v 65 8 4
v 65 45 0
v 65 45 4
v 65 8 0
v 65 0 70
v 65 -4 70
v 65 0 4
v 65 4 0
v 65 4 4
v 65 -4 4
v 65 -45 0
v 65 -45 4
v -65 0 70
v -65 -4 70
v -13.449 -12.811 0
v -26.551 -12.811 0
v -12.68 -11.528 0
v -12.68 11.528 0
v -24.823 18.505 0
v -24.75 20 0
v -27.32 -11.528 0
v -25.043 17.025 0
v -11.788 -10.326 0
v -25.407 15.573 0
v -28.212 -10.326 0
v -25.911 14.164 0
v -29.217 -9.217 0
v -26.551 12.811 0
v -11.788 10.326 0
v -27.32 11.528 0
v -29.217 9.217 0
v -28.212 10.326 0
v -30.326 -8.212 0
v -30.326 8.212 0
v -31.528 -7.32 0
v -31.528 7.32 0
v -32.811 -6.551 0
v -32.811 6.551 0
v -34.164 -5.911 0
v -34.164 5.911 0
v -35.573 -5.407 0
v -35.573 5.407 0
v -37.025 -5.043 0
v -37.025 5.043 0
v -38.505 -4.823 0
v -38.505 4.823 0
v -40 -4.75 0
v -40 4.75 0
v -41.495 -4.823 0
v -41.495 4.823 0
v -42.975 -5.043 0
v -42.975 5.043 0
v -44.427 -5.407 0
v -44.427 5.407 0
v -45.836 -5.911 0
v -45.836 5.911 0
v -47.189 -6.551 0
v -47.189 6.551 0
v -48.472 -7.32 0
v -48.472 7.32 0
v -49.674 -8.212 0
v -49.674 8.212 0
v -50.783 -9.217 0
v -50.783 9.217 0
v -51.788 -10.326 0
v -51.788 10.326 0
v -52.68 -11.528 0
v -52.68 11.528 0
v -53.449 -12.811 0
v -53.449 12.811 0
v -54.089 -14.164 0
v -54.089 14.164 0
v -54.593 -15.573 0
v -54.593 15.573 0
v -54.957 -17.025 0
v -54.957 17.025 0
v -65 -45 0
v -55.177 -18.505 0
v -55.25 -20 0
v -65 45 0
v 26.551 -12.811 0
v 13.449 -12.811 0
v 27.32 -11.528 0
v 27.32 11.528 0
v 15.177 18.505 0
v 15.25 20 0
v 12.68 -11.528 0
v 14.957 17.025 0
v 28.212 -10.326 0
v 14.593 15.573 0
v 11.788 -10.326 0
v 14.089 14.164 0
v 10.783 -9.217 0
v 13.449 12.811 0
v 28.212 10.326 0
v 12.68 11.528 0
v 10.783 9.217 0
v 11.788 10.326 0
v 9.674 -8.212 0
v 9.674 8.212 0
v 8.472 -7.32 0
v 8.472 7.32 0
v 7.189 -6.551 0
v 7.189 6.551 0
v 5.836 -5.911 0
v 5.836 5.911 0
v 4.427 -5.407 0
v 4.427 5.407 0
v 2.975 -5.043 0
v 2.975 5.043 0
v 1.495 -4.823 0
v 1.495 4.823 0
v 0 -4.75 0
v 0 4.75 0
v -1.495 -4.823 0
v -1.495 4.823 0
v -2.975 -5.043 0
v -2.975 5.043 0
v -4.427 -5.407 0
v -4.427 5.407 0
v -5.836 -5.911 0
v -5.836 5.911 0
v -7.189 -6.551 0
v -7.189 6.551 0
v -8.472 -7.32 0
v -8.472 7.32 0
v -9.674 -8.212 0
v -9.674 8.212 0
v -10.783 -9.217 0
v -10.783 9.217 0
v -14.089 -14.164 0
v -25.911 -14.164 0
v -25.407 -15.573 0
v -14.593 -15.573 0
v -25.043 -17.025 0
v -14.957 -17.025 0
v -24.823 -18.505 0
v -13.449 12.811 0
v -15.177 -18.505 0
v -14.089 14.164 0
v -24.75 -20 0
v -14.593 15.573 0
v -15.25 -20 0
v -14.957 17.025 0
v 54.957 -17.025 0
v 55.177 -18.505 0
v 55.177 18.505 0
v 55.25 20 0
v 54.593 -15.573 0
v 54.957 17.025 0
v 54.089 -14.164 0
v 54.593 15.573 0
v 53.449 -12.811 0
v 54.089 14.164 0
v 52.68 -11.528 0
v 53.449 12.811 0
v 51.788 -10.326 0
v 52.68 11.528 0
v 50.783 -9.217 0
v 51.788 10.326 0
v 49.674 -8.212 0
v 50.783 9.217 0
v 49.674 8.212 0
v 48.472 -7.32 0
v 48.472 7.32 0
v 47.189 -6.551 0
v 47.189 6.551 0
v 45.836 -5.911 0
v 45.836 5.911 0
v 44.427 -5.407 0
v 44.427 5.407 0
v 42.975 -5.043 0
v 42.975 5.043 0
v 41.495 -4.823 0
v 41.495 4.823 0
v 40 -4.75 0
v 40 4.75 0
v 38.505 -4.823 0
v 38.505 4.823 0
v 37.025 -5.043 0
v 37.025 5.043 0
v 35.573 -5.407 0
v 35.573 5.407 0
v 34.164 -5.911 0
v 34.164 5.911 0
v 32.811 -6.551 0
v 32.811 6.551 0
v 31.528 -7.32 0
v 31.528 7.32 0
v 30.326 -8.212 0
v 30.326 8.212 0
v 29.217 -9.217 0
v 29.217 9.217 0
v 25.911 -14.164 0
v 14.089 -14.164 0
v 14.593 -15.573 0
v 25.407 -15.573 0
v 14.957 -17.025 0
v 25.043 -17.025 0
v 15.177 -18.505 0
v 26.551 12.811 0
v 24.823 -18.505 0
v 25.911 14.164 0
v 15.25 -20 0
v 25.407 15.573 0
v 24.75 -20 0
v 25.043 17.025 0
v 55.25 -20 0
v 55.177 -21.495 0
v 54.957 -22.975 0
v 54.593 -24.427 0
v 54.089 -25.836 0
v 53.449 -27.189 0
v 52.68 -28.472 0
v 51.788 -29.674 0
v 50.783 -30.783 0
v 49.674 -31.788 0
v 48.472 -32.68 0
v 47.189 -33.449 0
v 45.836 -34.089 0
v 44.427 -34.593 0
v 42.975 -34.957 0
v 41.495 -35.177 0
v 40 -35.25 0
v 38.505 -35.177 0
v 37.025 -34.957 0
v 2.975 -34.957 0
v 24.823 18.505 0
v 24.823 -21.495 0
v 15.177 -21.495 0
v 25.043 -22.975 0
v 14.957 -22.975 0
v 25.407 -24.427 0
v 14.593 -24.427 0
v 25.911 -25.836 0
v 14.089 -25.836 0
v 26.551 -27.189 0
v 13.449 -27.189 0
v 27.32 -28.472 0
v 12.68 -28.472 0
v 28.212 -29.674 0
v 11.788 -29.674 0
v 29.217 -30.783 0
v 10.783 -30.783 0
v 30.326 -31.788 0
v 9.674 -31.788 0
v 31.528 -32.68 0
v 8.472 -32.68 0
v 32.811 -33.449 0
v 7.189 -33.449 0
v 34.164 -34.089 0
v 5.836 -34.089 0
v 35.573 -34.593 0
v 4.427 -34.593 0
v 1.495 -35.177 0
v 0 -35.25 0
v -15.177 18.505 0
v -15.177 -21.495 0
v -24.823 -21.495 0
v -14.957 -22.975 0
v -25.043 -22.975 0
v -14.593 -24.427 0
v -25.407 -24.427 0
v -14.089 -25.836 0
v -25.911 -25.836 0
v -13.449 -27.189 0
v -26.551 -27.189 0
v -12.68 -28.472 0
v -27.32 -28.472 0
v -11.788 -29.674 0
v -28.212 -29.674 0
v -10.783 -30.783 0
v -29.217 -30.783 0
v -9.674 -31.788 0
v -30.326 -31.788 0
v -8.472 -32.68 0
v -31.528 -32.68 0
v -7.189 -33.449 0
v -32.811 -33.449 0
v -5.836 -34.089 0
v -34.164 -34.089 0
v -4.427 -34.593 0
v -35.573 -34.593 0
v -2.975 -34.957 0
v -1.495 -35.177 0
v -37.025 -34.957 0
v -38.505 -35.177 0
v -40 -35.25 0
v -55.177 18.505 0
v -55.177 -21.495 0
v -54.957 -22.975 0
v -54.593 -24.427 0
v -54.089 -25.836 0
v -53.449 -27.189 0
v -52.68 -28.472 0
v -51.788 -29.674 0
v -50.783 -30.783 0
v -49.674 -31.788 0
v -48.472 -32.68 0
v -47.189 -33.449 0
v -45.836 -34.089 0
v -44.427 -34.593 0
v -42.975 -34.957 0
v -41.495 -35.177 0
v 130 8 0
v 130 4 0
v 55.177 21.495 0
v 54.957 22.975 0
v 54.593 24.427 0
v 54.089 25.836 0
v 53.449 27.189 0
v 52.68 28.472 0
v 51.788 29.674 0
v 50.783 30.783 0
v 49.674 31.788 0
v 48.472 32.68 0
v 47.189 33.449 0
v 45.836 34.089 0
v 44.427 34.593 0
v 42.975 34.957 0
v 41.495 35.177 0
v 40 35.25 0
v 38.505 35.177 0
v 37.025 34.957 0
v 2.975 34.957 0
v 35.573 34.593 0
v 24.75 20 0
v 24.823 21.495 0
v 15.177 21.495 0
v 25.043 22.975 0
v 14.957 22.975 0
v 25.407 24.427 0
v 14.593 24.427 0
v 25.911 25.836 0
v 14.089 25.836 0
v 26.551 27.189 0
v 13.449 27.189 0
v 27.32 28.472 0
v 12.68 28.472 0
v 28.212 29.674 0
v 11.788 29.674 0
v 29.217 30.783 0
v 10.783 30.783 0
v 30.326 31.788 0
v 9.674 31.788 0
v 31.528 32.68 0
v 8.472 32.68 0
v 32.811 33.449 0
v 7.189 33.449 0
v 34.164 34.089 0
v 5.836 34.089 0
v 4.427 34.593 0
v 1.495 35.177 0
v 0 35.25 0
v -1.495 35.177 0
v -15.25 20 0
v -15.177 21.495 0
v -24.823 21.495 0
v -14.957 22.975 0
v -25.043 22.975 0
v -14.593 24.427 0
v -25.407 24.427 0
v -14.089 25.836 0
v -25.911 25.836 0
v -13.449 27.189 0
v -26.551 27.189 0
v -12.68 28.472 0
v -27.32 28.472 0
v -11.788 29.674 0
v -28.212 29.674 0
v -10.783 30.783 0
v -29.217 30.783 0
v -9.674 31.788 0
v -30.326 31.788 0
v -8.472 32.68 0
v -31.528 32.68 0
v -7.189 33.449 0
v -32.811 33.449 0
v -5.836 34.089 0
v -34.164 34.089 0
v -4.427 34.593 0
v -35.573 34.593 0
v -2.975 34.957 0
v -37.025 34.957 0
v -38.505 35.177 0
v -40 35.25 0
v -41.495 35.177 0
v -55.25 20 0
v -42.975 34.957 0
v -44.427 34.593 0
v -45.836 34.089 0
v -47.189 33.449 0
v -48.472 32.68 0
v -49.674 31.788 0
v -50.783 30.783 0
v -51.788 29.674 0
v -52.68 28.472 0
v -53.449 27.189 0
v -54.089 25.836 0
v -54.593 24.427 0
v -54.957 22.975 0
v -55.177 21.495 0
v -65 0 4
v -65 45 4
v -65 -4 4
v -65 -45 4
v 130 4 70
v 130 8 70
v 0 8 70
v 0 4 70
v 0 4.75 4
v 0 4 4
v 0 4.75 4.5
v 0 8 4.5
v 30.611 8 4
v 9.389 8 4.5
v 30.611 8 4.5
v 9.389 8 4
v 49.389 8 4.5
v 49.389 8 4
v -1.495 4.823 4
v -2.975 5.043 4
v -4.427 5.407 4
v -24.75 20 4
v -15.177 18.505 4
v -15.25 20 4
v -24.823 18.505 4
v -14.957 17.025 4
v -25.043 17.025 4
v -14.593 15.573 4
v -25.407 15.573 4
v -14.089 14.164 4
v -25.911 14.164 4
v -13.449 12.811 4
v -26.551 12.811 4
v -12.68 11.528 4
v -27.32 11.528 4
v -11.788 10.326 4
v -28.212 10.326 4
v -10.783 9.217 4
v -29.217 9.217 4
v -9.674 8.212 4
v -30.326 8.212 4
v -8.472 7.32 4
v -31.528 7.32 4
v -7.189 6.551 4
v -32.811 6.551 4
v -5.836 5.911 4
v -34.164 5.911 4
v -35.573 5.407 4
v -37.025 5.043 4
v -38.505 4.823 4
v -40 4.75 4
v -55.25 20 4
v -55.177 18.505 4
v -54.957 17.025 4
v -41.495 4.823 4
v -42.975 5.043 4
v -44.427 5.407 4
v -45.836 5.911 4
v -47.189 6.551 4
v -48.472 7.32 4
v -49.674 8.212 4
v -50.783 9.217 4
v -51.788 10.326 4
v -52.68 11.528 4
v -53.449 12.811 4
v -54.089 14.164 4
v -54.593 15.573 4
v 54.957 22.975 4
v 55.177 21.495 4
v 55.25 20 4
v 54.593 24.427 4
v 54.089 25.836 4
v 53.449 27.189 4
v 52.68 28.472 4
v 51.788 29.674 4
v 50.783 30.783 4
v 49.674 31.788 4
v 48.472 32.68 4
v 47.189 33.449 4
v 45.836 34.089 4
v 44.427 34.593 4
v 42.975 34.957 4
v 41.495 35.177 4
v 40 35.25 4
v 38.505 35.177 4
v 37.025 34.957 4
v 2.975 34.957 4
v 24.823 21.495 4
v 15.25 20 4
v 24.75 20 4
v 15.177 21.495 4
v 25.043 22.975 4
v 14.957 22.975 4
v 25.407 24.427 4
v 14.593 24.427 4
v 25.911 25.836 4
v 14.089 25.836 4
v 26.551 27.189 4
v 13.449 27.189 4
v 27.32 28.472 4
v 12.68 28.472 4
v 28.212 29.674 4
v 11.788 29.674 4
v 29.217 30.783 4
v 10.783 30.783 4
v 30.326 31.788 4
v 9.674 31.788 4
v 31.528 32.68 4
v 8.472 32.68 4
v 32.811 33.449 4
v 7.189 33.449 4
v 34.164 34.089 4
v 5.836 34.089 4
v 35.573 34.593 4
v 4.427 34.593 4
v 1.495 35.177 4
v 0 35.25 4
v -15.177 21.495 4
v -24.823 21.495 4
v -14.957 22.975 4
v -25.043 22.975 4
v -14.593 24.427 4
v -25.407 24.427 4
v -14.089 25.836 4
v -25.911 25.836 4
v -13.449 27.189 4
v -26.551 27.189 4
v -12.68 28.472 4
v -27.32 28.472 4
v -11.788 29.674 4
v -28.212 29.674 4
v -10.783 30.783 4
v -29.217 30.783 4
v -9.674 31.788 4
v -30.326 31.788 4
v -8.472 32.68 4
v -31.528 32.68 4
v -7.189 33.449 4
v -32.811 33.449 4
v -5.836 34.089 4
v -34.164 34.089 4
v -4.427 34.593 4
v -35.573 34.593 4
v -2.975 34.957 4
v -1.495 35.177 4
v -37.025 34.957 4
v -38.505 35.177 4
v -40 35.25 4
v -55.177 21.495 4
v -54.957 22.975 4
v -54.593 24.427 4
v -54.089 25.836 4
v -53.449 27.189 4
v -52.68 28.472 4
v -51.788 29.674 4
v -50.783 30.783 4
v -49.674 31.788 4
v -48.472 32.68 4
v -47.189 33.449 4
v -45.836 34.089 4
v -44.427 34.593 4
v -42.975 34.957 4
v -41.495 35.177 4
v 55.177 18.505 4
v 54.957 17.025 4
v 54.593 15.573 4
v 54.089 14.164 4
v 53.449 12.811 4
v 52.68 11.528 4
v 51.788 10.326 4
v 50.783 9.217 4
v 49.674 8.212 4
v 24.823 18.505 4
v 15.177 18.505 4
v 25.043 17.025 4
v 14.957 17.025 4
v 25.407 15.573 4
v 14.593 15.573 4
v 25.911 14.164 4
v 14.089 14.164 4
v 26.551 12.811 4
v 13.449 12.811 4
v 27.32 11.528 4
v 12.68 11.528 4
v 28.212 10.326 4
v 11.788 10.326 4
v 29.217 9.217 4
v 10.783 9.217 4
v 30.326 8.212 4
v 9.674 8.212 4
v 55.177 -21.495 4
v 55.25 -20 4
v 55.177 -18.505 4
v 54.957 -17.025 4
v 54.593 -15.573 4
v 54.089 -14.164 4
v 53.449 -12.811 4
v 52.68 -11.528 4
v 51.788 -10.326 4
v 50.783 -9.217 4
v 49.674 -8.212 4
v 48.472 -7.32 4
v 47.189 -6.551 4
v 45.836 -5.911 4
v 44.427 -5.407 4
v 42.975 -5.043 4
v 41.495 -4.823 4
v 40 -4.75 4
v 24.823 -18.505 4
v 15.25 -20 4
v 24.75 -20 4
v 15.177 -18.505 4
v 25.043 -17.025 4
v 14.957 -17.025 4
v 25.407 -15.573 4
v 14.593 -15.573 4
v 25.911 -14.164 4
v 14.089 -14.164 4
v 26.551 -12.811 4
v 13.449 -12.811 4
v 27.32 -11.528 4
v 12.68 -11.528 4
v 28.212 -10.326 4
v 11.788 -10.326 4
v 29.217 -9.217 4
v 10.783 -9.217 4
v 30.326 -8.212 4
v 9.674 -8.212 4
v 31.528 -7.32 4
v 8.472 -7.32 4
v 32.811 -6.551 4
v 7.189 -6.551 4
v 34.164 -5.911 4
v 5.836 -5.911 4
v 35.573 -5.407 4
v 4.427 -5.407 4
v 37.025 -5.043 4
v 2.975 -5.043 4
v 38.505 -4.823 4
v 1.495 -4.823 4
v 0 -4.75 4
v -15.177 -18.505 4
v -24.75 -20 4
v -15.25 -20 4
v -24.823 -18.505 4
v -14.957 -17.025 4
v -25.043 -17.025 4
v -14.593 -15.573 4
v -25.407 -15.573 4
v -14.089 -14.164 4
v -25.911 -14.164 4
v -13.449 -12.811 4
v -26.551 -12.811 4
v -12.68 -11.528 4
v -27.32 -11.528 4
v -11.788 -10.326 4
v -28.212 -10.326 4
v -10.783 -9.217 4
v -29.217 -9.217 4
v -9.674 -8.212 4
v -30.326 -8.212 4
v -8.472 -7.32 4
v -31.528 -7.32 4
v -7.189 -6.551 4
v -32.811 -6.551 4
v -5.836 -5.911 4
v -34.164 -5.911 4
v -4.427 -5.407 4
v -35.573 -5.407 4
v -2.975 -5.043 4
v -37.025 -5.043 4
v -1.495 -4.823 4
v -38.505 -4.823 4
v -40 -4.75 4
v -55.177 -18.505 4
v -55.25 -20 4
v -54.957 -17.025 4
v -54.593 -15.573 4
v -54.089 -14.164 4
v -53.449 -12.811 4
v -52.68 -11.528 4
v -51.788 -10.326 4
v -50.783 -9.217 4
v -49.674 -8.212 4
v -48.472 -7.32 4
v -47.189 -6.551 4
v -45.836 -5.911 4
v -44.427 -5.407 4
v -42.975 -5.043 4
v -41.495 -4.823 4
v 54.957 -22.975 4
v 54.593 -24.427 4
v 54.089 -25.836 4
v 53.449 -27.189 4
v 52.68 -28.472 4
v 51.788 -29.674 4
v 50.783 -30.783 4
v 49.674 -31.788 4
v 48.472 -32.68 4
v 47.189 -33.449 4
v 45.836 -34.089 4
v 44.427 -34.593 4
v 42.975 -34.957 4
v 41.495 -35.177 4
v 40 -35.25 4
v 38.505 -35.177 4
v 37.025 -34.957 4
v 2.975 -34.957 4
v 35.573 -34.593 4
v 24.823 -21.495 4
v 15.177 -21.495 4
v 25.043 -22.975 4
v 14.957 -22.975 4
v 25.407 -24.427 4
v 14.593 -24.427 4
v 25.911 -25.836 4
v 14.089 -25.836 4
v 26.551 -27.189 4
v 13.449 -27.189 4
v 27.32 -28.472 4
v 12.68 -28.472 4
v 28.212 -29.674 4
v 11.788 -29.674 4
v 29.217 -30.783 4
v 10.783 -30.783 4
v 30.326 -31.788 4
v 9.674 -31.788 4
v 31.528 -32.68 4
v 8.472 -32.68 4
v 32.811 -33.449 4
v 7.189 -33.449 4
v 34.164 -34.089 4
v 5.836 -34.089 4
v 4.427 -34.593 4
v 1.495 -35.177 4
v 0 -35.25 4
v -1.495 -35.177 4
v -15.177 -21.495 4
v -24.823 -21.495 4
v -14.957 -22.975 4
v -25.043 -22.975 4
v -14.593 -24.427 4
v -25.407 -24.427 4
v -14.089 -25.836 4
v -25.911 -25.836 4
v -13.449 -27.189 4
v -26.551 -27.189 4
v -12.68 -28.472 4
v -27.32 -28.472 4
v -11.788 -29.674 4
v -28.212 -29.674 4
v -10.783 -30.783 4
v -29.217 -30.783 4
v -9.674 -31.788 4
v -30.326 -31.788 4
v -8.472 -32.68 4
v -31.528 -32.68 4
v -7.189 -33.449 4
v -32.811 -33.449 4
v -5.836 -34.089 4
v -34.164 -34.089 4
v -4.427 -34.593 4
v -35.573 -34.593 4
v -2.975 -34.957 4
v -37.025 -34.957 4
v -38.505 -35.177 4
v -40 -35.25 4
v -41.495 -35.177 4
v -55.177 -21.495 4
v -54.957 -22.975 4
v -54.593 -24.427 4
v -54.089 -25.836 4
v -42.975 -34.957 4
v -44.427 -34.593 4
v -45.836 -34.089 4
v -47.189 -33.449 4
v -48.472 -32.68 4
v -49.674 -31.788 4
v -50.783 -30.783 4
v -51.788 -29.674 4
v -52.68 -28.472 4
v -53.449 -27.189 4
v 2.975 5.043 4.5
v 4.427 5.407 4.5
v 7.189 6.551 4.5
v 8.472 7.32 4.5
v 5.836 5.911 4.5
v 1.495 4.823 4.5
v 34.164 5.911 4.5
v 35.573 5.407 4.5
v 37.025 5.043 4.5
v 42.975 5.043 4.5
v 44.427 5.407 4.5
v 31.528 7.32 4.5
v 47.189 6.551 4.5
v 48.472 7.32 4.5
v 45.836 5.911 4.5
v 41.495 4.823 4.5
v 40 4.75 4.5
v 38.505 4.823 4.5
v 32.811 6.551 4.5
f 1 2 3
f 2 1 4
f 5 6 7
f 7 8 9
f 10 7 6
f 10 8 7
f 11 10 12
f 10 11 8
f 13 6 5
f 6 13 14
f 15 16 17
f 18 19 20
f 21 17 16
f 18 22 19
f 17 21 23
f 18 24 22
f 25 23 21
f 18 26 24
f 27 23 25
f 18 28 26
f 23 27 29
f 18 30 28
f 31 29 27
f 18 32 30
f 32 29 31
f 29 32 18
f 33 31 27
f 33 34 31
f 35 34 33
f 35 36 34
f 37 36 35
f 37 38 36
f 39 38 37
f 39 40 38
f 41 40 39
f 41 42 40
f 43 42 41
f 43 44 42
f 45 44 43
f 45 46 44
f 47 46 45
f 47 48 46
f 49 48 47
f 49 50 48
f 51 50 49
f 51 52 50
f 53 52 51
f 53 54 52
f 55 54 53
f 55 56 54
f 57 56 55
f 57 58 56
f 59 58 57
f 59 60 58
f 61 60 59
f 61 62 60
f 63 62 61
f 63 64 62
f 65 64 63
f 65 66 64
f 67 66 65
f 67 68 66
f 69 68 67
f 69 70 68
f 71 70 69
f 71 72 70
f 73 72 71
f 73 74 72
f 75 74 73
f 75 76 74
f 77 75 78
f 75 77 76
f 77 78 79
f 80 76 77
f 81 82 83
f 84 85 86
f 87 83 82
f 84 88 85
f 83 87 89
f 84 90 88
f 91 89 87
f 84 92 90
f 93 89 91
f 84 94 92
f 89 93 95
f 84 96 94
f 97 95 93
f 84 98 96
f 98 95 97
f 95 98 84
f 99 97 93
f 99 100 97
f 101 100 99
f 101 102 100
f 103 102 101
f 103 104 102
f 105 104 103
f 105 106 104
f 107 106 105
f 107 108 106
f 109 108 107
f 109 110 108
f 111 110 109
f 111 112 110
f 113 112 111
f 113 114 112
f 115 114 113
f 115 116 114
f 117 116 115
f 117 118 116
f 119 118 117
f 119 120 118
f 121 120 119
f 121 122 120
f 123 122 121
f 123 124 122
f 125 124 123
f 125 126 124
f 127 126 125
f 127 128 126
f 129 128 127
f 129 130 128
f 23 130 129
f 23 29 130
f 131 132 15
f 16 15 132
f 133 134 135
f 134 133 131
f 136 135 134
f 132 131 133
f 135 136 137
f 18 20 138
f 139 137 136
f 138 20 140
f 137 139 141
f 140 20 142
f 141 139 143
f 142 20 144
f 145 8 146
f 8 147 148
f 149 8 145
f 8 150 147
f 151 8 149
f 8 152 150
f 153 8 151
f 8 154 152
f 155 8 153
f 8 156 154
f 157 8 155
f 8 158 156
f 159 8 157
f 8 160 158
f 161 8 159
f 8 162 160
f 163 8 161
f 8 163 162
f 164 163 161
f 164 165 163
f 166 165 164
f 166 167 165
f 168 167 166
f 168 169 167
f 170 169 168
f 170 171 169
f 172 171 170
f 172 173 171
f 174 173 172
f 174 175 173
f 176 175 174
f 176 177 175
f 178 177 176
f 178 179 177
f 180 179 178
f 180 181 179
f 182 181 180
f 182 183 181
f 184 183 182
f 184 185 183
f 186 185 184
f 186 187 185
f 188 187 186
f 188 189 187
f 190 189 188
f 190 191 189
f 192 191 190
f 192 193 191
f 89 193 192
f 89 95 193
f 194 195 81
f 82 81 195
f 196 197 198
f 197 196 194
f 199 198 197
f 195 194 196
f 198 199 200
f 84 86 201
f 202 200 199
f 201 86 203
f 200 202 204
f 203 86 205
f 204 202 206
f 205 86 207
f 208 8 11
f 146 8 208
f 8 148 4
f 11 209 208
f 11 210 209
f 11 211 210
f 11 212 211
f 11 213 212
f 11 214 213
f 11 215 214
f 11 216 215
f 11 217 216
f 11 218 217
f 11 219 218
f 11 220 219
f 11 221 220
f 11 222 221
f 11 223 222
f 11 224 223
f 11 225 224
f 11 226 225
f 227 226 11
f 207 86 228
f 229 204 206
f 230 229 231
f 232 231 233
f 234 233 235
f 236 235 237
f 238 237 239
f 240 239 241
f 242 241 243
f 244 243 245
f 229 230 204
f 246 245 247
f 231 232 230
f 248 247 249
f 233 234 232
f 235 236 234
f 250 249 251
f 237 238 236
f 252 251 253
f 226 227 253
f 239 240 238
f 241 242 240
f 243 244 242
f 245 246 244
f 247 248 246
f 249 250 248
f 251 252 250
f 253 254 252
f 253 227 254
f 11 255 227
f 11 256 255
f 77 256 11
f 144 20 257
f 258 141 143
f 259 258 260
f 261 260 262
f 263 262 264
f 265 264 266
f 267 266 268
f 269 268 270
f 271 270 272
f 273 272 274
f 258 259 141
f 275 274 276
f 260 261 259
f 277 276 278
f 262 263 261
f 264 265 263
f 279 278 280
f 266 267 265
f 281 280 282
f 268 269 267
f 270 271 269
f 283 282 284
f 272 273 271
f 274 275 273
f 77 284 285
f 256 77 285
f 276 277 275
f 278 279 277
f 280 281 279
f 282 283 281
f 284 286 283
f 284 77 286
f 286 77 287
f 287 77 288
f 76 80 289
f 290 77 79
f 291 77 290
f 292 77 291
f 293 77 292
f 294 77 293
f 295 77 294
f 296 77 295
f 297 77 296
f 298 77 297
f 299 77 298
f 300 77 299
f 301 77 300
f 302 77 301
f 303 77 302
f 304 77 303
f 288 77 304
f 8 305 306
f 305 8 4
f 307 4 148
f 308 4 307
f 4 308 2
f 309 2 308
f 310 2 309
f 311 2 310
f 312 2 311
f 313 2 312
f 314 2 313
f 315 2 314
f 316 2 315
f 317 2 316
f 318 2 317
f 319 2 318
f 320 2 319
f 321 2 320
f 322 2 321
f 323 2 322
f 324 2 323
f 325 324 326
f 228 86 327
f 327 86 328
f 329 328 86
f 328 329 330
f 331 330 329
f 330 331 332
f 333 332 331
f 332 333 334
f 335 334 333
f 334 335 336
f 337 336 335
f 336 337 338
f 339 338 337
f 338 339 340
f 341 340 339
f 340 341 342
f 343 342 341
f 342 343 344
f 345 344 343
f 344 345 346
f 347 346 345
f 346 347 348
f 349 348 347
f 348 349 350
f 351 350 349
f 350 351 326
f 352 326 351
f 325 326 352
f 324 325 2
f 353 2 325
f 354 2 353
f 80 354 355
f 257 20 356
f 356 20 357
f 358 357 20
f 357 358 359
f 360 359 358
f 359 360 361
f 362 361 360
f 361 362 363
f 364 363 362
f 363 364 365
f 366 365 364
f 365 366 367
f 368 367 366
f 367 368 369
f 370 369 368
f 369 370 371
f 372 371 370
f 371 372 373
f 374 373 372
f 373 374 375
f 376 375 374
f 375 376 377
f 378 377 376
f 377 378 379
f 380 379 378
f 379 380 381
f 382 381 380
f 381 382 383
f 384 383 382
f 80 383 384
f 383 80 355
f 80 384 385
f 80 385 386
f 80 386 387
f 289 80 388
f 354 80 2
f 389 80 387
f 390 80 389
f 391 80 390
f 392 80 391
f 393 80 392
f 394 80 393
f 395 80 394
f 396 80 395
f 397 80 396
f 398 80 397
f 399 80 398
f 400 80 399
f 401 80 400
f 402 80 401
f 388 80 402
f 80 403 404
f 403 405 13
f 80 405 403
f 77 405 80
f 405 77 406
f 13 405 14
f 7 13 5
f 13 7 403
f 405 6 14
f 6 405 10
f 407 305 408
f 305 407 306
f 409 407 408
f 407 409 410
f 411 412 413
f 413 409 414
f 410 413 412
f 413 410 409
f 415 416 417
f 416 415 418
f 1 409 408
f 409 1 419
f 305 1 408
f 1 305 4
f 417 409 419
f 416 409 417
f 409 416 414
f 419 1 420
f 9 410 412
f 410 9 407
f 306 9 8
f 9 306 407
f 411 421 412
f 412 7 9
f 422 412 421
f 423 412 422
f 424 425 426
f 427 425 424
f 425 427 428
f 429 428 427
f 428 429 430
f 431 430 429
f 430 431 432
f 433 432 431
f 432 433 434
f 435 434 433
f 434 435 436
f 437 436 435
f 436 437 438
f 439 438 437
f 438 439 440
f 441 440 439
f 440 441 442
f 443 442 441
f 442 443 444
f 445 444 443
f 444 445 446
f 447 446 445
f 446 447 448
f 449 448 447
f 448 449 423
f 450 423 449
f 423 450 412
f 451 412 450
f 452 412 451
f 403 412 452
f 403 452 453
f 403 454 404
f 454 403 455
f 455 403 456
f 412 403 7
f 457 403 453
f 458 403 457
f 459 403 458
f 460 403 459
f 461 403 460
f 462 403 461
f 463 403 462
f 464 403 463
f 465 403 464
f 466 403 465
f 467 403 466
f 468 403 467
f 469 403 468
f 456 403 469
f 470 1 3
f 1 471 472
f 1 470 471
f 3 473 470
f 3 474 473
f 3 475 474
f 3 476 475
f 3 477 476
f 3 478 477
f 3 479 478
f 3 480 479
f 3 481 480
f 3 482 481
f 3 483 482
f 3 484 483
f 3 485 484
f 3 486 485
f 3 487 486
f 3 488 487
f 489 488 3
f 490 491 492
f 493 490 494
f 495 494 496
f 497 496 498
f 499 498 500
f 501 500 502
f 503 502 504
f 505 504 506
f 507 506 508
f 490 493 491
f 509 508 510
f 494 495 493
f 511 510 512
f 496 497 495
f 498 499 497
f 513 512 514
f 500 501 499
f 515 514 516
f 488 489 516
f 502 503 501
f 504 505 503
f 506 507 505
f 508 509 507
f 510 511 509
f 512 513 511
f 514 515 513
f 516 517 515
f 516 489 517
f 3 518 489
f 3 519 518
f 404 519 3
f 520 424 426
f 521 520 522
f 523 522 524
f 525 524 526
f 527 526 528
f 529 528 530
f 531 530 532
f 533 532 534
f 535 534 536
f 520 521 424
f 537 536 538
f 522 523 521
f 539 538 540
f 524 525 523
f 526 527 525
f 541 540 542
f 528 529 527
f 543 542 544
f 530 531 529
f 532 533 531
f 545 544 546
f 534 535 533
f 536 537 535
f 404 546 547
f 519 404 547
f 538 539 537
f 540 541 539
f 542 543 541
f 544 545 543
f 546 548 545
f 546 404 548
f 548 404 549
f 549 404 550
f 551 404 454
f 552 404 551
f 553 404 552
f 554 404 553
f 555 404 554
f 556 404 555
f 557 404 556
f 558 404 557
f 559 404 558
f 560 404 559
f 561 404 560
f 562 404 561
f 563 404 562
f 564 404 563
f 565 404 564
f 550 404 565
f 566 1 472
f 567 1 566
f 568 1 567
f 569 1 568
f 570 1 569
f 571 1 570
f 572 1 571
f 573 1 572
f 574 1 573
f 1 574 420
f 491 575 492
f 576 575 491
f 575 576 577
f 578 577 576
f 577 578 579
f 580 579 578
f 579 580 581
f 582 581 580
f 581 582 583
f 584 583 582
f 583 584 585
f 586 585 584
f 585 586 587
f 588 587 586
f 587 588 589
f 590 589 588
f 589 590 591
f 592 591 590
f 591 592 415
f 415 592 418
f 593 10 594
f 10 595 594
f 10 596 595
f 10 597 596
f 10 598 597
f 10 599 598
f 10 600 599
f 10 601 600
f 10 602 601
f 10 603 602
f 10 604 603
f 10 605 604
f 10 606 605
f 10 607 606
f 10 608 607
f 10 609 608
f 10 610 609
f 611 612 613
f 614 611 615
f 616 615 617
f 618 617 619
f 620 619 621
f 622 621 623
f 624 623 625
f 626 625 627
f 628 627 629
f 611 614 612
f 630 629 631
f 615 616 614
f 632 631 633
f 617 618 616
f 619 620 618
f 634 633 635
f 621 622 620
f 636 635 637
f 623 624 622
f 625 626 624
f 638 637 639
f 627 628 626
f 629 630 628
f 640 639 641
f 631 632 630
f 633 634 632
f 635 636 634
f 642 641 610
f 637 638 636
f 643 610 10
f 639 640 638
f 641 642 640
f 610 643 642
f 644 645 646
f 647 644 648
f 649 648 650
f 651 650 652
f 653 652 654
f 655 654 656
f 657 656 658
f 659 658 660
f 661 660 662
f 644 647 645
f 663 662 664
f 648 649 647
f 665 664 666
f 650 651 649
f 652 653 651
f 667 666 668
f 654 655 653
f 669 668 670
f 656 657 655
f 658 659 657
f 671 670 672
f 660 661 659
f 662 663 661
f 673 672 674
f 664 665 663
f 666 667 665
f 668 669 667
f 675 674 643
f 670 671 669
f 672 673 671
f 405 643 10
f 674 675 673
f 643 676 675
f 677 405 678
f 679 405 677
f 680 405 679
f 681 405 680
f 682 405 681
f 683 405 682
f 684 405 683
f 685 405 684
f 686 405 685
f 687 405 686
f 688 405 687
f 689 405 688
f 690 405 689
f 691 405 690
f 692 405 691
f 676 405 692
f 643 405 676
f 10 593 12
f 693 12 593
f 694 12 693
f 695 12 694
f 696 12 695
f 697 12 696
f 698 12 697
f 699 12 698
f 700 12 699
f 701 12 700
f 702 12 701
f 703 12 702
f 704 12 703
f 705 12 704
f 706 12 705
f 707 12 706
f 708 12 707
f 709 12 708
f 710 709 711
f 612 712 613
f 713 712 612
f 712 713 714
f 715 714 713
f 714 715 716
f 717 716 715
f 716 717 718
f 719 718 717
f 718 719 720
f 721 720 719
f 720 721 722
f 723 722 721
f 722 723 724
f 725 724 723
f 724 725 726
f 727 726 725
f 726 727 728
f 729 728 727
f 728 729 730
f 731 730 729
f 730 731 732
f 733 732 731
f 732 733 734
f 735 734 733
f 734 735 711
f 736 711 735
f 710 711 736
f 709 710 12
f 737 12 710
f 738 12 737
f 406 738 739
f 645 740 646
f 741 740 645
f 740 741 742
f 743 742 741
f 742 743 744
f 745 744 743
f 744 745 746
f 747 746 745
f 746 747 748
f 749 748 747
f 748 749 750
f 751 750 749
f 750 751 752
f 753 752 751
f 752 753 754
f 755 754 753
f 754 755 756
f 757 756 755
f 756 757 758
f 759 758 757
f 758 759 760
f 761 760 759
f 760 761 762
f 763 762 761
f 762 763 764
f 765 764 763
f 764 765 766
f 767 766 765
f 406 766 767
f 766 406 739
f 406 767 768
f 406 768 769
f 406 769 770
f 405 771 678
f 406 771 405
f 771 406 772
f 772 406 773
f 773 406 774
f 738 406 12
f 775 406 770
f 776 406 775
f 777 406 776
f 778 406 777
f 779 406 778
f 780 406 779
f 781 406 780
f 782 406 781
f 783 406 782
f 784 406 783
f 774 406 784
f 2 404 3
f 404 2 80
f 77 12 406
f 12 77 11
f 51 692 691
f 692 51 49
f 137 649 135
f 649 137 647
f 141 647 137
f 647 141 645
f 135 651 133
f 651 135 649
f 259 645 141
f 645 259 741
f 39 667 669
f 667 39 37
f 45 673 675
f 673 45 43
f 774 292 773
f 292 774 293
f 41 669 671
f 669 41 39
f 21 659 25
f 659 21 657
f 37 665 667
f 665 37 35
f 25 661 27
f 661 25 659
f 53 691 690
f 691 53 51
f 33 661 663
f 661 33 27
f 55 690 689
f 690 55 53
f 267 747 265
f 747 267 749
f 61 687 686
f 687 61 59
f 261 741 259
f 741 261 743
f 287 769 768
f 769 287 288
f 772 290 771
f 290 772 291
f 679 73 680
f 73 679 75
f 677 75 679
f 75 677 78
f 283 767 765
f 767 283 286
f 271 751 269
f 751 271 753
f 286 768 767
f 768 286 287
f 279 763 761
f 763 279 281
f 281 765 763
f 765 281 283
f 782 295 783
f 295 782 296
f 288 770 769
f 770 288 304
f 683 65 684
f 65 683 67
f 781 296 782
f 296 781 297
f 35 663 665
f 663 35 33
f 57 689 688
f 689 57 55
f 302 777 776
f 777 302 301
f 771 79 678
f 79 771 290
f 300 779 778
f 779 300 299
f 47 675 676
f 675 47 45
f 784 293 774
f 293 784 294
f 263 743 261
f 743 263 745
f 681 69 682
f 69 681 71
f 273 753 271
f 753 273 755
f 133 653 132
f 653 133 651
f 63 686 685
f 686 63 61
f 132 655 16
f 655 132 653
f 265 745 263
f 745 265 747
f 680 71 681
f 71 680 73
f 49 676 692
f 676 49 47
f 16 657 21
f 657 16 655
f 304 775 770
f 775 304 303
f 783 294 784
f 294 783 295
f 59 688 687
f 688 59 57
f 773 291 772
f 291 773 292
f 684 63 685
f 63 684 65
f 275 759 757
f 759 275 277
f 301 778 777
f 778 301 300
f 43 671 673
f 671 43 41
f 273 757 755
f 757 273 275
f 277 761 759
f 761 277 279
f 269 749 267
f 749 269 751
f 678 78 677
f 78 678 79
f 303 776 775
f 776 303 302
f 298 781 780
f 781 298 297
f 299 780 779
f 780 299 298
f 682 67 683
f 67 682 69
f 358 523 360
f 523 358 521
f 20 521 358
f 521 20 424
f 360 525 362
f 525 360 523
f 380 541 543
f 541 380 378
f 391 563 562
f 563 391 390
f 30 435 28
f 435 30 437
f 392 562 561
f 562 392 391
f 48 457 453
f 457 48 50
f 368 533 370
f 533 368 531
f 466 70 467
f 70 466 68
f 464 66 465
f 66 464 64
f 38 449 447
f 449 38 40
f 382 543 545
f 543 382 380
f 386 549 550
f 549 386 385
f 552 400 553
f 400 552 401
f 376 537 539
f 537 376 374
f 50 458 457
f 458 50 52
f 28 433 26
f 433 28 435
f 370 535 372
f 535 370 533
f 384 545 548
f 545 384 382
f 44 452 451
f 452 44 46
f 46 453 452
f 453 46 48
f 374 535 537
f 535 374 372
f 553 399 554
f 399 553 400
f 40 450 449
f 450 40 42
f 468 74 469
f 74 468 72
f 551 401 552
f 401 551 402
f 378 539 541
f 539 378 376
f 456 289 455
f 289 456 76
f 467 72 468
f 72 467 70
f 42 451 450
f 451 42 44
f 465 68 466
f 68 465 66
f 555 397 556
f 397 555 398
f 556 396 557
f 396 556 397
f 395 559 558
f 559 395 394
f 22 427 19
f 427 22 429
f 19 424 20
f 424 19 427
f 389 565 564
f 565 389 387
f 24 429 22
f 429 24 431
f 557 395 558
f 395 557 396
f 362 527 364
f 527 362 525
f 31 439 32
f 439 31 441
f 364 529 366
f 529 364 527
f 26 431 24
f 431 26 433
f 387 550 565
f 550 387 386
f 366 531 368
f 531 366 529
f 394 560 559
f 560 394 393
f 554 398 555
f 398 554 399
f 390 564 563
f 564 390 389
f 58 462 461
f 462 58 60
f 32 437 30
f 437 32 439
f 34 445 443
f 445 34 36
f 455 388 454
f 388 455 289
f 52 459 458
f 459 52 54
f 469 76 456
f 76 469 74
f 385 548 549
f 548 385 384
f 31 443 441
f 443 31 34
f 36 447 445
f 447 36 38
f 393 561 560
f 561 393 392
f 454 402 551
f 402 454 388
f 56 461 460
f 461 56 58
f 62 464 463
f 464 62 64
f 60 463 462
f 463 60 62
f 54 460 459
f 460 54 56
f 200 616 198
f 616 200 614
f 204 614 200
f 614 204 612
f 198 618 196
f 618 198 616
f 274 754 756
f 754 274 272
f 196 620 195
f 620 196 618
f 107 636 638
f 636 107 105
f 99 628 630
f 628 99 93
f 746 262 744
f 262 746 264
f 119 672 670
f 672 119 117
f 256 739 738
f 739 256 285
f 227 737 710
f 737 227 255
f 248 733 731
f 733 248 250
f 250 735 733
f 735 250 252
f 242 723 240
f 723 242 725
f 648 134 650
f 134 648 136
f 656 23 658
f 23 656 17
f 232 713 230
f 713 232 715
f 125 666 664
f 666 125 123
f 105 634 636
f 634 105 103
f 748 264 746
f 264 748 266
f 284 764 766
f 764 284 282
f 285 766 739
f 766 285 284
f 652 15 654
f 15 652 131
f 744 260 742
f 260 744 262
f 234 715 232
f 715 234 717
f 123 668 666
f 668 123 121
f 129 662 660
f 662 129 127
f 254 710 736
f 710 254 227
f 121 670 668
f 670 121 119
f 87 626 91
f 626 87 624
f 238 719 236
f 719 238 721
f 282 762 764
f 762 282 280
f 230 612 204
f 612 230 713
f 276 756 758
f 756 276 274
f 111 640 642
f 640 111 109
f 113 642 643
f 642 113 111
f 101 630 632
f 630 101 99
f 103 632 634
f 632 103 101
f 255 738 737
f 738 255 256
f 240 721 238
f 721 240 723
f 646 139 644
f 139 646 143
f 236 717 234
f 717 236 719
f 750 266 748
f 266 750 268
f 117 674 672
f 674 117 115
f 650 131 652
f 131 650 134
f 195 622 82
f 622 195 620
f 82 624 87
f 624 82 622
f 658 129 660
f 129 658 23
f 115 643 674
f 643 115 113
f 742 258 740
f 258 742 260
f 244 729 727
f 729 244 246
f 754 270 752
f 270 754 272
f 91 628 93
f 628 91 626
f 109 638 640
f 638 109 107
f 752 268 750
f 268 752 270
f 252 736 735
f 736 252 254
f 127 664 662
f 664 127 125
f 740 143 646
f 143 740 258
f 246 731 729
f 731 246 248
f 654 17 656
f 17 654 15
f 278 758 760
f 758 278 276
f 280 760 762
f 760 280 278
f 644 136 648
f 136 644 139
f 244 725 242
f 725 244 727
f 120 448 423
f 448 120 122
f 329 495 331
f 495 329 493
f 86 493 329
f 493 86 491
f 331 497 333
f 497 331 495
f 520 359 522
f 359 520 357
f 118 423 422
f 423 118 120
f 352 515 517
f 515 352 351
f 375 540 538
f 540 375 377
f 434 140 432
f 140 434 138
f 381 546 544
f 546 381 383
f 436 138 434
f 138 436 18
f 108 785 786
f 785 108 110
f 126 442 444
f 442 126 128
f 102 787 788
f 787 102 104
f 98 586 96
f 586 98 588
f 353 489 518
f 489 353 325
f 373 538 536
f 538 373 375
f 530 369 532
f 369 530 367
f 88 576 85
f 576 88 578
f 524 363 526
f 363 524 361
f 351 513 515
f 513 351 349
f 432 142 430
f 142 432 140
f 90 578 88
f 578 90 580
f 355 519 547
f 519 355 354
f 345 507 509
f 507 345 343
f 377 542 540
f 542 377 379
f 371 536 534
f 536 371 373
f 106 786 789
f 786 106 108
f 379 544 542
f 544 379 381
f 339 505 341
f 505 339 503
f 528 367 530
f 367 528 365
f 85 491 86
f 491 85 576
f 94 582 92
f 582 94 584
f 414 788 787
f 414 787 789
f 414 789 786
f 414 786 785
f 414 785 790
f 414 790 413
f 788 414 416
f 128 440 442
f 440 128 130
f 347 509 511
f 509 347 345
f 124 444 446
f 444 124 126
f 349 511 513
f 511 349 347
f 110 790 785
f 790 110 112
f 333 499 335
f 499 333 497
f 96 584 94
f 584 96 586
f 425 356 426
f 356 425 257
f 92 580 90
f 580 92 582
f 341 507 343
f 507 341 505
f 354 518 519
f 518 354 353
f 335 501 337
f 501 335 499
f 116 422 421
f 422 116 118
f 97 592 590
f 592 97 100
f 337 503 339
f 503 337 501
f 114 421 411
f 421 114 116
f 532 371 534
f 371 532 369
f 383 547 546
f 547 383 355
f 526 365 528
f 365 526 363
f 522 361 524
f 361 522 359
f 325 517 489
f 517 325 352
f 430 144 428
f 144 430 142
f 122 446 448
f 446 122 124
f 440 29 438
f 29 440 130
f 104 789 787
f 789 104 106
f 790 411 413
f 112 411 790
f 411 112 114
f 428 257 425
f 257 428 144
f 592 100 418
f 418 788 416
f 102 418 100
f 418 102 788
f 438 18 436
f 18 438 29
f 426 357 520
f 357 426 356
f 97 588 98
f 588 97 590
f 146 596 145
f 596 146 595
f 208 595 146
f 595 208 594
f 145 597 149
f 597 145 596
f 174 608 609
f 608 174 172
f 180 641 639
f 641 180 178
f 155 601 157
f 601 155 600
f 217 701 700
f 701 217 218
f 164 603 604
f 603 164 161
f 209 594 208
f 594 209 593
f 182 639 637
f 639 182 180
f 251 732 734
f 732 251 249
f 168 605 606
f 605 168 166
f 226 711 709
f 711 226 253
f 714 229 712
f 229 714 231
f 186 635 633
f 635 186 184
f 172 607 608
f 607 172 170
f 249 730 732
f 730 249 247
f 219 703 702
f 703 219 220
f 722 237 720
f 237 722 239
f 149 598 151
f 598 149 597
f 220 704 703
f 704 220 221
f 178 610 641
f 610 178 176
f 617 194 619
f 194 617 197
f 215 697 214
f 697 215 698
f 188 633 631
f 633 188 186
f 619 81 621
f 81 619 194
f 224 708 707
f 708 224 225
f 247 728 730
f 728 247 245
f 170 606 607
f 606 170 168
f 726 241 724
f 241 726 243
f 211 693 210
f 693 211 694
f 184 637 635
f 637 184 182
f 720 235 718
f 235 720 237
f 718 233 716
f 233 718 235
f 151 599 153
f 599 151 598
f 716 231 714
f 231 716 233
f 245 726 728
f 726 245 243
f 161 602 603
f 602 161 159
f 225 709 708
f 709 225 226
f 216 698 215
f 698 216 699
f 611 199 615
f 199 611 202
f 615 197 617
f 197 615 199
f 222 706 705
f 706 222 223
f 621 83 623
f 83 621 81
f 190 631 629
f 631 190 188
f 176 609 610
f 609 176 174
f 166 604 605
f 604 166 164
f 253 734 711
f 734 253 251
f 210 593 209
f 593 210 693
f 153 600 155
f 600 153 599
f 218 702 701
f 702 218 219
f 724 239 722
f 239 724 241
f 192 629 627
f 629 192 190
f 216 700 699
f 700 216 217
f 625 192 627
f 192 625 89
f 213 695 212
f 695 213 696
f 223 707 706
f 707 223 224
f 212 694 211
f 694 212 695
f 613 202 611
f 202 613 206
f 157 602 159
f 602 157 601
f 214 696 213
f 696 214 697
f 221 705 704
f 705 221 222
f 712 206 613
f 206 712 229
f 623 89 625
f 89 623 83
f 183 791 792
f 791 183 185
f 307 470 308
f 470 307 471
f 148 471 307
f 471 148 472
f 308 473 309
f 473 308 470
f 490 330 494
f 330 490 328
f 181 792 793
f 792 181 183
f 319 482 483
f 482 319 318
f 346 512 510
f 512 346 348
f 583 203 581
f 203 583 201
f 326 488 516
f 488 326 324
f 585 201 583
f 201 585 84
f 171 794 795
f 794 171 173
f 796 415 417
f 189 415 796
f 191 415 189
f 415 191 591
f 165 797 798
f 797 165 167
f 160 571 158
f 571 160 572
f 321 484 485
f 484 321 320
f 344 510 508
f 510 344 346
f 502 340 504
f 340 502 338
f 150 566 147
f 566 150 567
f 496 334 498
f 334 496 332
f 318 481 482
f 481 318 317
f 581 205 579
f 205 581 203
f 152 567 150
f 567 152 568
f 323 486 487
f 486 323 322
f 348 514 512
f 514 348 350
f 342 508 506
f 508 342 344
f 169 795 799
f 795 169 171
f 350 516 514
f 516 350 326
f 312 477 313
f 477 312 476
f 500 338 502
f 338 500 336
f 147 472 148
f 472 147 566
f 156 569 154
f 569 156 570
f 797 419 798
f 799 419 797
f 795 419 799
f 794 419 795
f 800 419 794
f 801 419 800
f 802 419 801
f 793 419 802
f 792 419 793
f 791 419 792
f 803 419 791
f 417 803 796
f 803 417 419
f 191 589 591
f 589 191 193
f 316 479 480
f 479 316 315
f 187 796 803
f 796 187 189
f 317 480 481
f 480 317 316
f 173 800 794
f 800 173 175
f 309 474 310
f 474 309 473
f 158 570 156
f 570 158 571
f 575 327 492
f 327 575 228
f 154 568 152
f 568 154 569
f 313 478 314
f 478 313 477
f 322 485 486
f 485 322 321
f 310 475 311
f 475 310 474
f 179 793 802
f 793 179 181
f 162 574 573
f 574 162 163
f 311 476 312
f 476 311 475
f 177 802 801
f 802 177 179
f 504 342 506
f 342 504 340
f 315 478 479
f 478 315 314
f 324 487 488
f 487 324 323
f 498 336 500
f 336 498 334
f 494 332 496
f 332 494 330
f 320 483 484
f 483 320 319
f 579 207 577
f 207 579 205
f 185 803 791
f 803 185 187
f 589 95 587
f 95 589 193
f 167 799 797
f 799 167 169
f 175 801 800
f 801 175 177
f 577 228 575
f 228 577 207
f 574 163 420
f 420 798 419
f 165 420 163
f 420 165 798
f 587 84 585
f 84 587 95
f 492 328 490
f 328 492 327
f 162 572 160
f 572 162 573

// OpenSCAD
// Rack for six 50 mL conical (Falcon-type) tubes
// Print orientation: plate on bed, walls rising. Flipped after printing.

$fn = 64;

// ---- Plate ----
plate_x = 130;      // plate length (X)
plate_y = 90;       // plate width (Y)
plate_t = 4;        // plate thickness (Z)

// ---- Holes ----
hole_d     = 30.5;  // hole diameter
hole_nx    = 3;     // holes along X
hole_ny    = 2;     // holes along Y
hole_pitch = 40;    // centre-to-centre spacing (X and Y)

// ---- Walls ----
wall_len   = 130;   // wall length along X
wall_t     = 4;     // wall thickness along Y
wall_h     = 70;    // wall height (top at z = 70)

// ---- Misc ----
eps        = 0.5;   // cutter overshoot

difference() {
    union() {
        // Plate
        translate([-plate_x/2, -plate_y/2, 0])
            cube([plate_x, plate_y, plate_t]);

        // Walls along long edges
        for (s = [-1, 1])
            translate([s > 0 ? plate_x/2 - wall_len/2 : -plate_x/2,
                       s * wall_t, 0])
                cube([wall_len, wall_t, wall_h]);
    }

    // Holes
    for (i = [0 : hole_nx - 1])
        for (j = [0 : hole_ny - 1])
            translate([(i - (hole_nx - 1)/2) * hole_pitch,
                       (j - (hole_ny - 1)/2) * hole_pitch,
                       -eps])
                cylinder(d = hole_d, h = plate_t + 2*eps);
}
